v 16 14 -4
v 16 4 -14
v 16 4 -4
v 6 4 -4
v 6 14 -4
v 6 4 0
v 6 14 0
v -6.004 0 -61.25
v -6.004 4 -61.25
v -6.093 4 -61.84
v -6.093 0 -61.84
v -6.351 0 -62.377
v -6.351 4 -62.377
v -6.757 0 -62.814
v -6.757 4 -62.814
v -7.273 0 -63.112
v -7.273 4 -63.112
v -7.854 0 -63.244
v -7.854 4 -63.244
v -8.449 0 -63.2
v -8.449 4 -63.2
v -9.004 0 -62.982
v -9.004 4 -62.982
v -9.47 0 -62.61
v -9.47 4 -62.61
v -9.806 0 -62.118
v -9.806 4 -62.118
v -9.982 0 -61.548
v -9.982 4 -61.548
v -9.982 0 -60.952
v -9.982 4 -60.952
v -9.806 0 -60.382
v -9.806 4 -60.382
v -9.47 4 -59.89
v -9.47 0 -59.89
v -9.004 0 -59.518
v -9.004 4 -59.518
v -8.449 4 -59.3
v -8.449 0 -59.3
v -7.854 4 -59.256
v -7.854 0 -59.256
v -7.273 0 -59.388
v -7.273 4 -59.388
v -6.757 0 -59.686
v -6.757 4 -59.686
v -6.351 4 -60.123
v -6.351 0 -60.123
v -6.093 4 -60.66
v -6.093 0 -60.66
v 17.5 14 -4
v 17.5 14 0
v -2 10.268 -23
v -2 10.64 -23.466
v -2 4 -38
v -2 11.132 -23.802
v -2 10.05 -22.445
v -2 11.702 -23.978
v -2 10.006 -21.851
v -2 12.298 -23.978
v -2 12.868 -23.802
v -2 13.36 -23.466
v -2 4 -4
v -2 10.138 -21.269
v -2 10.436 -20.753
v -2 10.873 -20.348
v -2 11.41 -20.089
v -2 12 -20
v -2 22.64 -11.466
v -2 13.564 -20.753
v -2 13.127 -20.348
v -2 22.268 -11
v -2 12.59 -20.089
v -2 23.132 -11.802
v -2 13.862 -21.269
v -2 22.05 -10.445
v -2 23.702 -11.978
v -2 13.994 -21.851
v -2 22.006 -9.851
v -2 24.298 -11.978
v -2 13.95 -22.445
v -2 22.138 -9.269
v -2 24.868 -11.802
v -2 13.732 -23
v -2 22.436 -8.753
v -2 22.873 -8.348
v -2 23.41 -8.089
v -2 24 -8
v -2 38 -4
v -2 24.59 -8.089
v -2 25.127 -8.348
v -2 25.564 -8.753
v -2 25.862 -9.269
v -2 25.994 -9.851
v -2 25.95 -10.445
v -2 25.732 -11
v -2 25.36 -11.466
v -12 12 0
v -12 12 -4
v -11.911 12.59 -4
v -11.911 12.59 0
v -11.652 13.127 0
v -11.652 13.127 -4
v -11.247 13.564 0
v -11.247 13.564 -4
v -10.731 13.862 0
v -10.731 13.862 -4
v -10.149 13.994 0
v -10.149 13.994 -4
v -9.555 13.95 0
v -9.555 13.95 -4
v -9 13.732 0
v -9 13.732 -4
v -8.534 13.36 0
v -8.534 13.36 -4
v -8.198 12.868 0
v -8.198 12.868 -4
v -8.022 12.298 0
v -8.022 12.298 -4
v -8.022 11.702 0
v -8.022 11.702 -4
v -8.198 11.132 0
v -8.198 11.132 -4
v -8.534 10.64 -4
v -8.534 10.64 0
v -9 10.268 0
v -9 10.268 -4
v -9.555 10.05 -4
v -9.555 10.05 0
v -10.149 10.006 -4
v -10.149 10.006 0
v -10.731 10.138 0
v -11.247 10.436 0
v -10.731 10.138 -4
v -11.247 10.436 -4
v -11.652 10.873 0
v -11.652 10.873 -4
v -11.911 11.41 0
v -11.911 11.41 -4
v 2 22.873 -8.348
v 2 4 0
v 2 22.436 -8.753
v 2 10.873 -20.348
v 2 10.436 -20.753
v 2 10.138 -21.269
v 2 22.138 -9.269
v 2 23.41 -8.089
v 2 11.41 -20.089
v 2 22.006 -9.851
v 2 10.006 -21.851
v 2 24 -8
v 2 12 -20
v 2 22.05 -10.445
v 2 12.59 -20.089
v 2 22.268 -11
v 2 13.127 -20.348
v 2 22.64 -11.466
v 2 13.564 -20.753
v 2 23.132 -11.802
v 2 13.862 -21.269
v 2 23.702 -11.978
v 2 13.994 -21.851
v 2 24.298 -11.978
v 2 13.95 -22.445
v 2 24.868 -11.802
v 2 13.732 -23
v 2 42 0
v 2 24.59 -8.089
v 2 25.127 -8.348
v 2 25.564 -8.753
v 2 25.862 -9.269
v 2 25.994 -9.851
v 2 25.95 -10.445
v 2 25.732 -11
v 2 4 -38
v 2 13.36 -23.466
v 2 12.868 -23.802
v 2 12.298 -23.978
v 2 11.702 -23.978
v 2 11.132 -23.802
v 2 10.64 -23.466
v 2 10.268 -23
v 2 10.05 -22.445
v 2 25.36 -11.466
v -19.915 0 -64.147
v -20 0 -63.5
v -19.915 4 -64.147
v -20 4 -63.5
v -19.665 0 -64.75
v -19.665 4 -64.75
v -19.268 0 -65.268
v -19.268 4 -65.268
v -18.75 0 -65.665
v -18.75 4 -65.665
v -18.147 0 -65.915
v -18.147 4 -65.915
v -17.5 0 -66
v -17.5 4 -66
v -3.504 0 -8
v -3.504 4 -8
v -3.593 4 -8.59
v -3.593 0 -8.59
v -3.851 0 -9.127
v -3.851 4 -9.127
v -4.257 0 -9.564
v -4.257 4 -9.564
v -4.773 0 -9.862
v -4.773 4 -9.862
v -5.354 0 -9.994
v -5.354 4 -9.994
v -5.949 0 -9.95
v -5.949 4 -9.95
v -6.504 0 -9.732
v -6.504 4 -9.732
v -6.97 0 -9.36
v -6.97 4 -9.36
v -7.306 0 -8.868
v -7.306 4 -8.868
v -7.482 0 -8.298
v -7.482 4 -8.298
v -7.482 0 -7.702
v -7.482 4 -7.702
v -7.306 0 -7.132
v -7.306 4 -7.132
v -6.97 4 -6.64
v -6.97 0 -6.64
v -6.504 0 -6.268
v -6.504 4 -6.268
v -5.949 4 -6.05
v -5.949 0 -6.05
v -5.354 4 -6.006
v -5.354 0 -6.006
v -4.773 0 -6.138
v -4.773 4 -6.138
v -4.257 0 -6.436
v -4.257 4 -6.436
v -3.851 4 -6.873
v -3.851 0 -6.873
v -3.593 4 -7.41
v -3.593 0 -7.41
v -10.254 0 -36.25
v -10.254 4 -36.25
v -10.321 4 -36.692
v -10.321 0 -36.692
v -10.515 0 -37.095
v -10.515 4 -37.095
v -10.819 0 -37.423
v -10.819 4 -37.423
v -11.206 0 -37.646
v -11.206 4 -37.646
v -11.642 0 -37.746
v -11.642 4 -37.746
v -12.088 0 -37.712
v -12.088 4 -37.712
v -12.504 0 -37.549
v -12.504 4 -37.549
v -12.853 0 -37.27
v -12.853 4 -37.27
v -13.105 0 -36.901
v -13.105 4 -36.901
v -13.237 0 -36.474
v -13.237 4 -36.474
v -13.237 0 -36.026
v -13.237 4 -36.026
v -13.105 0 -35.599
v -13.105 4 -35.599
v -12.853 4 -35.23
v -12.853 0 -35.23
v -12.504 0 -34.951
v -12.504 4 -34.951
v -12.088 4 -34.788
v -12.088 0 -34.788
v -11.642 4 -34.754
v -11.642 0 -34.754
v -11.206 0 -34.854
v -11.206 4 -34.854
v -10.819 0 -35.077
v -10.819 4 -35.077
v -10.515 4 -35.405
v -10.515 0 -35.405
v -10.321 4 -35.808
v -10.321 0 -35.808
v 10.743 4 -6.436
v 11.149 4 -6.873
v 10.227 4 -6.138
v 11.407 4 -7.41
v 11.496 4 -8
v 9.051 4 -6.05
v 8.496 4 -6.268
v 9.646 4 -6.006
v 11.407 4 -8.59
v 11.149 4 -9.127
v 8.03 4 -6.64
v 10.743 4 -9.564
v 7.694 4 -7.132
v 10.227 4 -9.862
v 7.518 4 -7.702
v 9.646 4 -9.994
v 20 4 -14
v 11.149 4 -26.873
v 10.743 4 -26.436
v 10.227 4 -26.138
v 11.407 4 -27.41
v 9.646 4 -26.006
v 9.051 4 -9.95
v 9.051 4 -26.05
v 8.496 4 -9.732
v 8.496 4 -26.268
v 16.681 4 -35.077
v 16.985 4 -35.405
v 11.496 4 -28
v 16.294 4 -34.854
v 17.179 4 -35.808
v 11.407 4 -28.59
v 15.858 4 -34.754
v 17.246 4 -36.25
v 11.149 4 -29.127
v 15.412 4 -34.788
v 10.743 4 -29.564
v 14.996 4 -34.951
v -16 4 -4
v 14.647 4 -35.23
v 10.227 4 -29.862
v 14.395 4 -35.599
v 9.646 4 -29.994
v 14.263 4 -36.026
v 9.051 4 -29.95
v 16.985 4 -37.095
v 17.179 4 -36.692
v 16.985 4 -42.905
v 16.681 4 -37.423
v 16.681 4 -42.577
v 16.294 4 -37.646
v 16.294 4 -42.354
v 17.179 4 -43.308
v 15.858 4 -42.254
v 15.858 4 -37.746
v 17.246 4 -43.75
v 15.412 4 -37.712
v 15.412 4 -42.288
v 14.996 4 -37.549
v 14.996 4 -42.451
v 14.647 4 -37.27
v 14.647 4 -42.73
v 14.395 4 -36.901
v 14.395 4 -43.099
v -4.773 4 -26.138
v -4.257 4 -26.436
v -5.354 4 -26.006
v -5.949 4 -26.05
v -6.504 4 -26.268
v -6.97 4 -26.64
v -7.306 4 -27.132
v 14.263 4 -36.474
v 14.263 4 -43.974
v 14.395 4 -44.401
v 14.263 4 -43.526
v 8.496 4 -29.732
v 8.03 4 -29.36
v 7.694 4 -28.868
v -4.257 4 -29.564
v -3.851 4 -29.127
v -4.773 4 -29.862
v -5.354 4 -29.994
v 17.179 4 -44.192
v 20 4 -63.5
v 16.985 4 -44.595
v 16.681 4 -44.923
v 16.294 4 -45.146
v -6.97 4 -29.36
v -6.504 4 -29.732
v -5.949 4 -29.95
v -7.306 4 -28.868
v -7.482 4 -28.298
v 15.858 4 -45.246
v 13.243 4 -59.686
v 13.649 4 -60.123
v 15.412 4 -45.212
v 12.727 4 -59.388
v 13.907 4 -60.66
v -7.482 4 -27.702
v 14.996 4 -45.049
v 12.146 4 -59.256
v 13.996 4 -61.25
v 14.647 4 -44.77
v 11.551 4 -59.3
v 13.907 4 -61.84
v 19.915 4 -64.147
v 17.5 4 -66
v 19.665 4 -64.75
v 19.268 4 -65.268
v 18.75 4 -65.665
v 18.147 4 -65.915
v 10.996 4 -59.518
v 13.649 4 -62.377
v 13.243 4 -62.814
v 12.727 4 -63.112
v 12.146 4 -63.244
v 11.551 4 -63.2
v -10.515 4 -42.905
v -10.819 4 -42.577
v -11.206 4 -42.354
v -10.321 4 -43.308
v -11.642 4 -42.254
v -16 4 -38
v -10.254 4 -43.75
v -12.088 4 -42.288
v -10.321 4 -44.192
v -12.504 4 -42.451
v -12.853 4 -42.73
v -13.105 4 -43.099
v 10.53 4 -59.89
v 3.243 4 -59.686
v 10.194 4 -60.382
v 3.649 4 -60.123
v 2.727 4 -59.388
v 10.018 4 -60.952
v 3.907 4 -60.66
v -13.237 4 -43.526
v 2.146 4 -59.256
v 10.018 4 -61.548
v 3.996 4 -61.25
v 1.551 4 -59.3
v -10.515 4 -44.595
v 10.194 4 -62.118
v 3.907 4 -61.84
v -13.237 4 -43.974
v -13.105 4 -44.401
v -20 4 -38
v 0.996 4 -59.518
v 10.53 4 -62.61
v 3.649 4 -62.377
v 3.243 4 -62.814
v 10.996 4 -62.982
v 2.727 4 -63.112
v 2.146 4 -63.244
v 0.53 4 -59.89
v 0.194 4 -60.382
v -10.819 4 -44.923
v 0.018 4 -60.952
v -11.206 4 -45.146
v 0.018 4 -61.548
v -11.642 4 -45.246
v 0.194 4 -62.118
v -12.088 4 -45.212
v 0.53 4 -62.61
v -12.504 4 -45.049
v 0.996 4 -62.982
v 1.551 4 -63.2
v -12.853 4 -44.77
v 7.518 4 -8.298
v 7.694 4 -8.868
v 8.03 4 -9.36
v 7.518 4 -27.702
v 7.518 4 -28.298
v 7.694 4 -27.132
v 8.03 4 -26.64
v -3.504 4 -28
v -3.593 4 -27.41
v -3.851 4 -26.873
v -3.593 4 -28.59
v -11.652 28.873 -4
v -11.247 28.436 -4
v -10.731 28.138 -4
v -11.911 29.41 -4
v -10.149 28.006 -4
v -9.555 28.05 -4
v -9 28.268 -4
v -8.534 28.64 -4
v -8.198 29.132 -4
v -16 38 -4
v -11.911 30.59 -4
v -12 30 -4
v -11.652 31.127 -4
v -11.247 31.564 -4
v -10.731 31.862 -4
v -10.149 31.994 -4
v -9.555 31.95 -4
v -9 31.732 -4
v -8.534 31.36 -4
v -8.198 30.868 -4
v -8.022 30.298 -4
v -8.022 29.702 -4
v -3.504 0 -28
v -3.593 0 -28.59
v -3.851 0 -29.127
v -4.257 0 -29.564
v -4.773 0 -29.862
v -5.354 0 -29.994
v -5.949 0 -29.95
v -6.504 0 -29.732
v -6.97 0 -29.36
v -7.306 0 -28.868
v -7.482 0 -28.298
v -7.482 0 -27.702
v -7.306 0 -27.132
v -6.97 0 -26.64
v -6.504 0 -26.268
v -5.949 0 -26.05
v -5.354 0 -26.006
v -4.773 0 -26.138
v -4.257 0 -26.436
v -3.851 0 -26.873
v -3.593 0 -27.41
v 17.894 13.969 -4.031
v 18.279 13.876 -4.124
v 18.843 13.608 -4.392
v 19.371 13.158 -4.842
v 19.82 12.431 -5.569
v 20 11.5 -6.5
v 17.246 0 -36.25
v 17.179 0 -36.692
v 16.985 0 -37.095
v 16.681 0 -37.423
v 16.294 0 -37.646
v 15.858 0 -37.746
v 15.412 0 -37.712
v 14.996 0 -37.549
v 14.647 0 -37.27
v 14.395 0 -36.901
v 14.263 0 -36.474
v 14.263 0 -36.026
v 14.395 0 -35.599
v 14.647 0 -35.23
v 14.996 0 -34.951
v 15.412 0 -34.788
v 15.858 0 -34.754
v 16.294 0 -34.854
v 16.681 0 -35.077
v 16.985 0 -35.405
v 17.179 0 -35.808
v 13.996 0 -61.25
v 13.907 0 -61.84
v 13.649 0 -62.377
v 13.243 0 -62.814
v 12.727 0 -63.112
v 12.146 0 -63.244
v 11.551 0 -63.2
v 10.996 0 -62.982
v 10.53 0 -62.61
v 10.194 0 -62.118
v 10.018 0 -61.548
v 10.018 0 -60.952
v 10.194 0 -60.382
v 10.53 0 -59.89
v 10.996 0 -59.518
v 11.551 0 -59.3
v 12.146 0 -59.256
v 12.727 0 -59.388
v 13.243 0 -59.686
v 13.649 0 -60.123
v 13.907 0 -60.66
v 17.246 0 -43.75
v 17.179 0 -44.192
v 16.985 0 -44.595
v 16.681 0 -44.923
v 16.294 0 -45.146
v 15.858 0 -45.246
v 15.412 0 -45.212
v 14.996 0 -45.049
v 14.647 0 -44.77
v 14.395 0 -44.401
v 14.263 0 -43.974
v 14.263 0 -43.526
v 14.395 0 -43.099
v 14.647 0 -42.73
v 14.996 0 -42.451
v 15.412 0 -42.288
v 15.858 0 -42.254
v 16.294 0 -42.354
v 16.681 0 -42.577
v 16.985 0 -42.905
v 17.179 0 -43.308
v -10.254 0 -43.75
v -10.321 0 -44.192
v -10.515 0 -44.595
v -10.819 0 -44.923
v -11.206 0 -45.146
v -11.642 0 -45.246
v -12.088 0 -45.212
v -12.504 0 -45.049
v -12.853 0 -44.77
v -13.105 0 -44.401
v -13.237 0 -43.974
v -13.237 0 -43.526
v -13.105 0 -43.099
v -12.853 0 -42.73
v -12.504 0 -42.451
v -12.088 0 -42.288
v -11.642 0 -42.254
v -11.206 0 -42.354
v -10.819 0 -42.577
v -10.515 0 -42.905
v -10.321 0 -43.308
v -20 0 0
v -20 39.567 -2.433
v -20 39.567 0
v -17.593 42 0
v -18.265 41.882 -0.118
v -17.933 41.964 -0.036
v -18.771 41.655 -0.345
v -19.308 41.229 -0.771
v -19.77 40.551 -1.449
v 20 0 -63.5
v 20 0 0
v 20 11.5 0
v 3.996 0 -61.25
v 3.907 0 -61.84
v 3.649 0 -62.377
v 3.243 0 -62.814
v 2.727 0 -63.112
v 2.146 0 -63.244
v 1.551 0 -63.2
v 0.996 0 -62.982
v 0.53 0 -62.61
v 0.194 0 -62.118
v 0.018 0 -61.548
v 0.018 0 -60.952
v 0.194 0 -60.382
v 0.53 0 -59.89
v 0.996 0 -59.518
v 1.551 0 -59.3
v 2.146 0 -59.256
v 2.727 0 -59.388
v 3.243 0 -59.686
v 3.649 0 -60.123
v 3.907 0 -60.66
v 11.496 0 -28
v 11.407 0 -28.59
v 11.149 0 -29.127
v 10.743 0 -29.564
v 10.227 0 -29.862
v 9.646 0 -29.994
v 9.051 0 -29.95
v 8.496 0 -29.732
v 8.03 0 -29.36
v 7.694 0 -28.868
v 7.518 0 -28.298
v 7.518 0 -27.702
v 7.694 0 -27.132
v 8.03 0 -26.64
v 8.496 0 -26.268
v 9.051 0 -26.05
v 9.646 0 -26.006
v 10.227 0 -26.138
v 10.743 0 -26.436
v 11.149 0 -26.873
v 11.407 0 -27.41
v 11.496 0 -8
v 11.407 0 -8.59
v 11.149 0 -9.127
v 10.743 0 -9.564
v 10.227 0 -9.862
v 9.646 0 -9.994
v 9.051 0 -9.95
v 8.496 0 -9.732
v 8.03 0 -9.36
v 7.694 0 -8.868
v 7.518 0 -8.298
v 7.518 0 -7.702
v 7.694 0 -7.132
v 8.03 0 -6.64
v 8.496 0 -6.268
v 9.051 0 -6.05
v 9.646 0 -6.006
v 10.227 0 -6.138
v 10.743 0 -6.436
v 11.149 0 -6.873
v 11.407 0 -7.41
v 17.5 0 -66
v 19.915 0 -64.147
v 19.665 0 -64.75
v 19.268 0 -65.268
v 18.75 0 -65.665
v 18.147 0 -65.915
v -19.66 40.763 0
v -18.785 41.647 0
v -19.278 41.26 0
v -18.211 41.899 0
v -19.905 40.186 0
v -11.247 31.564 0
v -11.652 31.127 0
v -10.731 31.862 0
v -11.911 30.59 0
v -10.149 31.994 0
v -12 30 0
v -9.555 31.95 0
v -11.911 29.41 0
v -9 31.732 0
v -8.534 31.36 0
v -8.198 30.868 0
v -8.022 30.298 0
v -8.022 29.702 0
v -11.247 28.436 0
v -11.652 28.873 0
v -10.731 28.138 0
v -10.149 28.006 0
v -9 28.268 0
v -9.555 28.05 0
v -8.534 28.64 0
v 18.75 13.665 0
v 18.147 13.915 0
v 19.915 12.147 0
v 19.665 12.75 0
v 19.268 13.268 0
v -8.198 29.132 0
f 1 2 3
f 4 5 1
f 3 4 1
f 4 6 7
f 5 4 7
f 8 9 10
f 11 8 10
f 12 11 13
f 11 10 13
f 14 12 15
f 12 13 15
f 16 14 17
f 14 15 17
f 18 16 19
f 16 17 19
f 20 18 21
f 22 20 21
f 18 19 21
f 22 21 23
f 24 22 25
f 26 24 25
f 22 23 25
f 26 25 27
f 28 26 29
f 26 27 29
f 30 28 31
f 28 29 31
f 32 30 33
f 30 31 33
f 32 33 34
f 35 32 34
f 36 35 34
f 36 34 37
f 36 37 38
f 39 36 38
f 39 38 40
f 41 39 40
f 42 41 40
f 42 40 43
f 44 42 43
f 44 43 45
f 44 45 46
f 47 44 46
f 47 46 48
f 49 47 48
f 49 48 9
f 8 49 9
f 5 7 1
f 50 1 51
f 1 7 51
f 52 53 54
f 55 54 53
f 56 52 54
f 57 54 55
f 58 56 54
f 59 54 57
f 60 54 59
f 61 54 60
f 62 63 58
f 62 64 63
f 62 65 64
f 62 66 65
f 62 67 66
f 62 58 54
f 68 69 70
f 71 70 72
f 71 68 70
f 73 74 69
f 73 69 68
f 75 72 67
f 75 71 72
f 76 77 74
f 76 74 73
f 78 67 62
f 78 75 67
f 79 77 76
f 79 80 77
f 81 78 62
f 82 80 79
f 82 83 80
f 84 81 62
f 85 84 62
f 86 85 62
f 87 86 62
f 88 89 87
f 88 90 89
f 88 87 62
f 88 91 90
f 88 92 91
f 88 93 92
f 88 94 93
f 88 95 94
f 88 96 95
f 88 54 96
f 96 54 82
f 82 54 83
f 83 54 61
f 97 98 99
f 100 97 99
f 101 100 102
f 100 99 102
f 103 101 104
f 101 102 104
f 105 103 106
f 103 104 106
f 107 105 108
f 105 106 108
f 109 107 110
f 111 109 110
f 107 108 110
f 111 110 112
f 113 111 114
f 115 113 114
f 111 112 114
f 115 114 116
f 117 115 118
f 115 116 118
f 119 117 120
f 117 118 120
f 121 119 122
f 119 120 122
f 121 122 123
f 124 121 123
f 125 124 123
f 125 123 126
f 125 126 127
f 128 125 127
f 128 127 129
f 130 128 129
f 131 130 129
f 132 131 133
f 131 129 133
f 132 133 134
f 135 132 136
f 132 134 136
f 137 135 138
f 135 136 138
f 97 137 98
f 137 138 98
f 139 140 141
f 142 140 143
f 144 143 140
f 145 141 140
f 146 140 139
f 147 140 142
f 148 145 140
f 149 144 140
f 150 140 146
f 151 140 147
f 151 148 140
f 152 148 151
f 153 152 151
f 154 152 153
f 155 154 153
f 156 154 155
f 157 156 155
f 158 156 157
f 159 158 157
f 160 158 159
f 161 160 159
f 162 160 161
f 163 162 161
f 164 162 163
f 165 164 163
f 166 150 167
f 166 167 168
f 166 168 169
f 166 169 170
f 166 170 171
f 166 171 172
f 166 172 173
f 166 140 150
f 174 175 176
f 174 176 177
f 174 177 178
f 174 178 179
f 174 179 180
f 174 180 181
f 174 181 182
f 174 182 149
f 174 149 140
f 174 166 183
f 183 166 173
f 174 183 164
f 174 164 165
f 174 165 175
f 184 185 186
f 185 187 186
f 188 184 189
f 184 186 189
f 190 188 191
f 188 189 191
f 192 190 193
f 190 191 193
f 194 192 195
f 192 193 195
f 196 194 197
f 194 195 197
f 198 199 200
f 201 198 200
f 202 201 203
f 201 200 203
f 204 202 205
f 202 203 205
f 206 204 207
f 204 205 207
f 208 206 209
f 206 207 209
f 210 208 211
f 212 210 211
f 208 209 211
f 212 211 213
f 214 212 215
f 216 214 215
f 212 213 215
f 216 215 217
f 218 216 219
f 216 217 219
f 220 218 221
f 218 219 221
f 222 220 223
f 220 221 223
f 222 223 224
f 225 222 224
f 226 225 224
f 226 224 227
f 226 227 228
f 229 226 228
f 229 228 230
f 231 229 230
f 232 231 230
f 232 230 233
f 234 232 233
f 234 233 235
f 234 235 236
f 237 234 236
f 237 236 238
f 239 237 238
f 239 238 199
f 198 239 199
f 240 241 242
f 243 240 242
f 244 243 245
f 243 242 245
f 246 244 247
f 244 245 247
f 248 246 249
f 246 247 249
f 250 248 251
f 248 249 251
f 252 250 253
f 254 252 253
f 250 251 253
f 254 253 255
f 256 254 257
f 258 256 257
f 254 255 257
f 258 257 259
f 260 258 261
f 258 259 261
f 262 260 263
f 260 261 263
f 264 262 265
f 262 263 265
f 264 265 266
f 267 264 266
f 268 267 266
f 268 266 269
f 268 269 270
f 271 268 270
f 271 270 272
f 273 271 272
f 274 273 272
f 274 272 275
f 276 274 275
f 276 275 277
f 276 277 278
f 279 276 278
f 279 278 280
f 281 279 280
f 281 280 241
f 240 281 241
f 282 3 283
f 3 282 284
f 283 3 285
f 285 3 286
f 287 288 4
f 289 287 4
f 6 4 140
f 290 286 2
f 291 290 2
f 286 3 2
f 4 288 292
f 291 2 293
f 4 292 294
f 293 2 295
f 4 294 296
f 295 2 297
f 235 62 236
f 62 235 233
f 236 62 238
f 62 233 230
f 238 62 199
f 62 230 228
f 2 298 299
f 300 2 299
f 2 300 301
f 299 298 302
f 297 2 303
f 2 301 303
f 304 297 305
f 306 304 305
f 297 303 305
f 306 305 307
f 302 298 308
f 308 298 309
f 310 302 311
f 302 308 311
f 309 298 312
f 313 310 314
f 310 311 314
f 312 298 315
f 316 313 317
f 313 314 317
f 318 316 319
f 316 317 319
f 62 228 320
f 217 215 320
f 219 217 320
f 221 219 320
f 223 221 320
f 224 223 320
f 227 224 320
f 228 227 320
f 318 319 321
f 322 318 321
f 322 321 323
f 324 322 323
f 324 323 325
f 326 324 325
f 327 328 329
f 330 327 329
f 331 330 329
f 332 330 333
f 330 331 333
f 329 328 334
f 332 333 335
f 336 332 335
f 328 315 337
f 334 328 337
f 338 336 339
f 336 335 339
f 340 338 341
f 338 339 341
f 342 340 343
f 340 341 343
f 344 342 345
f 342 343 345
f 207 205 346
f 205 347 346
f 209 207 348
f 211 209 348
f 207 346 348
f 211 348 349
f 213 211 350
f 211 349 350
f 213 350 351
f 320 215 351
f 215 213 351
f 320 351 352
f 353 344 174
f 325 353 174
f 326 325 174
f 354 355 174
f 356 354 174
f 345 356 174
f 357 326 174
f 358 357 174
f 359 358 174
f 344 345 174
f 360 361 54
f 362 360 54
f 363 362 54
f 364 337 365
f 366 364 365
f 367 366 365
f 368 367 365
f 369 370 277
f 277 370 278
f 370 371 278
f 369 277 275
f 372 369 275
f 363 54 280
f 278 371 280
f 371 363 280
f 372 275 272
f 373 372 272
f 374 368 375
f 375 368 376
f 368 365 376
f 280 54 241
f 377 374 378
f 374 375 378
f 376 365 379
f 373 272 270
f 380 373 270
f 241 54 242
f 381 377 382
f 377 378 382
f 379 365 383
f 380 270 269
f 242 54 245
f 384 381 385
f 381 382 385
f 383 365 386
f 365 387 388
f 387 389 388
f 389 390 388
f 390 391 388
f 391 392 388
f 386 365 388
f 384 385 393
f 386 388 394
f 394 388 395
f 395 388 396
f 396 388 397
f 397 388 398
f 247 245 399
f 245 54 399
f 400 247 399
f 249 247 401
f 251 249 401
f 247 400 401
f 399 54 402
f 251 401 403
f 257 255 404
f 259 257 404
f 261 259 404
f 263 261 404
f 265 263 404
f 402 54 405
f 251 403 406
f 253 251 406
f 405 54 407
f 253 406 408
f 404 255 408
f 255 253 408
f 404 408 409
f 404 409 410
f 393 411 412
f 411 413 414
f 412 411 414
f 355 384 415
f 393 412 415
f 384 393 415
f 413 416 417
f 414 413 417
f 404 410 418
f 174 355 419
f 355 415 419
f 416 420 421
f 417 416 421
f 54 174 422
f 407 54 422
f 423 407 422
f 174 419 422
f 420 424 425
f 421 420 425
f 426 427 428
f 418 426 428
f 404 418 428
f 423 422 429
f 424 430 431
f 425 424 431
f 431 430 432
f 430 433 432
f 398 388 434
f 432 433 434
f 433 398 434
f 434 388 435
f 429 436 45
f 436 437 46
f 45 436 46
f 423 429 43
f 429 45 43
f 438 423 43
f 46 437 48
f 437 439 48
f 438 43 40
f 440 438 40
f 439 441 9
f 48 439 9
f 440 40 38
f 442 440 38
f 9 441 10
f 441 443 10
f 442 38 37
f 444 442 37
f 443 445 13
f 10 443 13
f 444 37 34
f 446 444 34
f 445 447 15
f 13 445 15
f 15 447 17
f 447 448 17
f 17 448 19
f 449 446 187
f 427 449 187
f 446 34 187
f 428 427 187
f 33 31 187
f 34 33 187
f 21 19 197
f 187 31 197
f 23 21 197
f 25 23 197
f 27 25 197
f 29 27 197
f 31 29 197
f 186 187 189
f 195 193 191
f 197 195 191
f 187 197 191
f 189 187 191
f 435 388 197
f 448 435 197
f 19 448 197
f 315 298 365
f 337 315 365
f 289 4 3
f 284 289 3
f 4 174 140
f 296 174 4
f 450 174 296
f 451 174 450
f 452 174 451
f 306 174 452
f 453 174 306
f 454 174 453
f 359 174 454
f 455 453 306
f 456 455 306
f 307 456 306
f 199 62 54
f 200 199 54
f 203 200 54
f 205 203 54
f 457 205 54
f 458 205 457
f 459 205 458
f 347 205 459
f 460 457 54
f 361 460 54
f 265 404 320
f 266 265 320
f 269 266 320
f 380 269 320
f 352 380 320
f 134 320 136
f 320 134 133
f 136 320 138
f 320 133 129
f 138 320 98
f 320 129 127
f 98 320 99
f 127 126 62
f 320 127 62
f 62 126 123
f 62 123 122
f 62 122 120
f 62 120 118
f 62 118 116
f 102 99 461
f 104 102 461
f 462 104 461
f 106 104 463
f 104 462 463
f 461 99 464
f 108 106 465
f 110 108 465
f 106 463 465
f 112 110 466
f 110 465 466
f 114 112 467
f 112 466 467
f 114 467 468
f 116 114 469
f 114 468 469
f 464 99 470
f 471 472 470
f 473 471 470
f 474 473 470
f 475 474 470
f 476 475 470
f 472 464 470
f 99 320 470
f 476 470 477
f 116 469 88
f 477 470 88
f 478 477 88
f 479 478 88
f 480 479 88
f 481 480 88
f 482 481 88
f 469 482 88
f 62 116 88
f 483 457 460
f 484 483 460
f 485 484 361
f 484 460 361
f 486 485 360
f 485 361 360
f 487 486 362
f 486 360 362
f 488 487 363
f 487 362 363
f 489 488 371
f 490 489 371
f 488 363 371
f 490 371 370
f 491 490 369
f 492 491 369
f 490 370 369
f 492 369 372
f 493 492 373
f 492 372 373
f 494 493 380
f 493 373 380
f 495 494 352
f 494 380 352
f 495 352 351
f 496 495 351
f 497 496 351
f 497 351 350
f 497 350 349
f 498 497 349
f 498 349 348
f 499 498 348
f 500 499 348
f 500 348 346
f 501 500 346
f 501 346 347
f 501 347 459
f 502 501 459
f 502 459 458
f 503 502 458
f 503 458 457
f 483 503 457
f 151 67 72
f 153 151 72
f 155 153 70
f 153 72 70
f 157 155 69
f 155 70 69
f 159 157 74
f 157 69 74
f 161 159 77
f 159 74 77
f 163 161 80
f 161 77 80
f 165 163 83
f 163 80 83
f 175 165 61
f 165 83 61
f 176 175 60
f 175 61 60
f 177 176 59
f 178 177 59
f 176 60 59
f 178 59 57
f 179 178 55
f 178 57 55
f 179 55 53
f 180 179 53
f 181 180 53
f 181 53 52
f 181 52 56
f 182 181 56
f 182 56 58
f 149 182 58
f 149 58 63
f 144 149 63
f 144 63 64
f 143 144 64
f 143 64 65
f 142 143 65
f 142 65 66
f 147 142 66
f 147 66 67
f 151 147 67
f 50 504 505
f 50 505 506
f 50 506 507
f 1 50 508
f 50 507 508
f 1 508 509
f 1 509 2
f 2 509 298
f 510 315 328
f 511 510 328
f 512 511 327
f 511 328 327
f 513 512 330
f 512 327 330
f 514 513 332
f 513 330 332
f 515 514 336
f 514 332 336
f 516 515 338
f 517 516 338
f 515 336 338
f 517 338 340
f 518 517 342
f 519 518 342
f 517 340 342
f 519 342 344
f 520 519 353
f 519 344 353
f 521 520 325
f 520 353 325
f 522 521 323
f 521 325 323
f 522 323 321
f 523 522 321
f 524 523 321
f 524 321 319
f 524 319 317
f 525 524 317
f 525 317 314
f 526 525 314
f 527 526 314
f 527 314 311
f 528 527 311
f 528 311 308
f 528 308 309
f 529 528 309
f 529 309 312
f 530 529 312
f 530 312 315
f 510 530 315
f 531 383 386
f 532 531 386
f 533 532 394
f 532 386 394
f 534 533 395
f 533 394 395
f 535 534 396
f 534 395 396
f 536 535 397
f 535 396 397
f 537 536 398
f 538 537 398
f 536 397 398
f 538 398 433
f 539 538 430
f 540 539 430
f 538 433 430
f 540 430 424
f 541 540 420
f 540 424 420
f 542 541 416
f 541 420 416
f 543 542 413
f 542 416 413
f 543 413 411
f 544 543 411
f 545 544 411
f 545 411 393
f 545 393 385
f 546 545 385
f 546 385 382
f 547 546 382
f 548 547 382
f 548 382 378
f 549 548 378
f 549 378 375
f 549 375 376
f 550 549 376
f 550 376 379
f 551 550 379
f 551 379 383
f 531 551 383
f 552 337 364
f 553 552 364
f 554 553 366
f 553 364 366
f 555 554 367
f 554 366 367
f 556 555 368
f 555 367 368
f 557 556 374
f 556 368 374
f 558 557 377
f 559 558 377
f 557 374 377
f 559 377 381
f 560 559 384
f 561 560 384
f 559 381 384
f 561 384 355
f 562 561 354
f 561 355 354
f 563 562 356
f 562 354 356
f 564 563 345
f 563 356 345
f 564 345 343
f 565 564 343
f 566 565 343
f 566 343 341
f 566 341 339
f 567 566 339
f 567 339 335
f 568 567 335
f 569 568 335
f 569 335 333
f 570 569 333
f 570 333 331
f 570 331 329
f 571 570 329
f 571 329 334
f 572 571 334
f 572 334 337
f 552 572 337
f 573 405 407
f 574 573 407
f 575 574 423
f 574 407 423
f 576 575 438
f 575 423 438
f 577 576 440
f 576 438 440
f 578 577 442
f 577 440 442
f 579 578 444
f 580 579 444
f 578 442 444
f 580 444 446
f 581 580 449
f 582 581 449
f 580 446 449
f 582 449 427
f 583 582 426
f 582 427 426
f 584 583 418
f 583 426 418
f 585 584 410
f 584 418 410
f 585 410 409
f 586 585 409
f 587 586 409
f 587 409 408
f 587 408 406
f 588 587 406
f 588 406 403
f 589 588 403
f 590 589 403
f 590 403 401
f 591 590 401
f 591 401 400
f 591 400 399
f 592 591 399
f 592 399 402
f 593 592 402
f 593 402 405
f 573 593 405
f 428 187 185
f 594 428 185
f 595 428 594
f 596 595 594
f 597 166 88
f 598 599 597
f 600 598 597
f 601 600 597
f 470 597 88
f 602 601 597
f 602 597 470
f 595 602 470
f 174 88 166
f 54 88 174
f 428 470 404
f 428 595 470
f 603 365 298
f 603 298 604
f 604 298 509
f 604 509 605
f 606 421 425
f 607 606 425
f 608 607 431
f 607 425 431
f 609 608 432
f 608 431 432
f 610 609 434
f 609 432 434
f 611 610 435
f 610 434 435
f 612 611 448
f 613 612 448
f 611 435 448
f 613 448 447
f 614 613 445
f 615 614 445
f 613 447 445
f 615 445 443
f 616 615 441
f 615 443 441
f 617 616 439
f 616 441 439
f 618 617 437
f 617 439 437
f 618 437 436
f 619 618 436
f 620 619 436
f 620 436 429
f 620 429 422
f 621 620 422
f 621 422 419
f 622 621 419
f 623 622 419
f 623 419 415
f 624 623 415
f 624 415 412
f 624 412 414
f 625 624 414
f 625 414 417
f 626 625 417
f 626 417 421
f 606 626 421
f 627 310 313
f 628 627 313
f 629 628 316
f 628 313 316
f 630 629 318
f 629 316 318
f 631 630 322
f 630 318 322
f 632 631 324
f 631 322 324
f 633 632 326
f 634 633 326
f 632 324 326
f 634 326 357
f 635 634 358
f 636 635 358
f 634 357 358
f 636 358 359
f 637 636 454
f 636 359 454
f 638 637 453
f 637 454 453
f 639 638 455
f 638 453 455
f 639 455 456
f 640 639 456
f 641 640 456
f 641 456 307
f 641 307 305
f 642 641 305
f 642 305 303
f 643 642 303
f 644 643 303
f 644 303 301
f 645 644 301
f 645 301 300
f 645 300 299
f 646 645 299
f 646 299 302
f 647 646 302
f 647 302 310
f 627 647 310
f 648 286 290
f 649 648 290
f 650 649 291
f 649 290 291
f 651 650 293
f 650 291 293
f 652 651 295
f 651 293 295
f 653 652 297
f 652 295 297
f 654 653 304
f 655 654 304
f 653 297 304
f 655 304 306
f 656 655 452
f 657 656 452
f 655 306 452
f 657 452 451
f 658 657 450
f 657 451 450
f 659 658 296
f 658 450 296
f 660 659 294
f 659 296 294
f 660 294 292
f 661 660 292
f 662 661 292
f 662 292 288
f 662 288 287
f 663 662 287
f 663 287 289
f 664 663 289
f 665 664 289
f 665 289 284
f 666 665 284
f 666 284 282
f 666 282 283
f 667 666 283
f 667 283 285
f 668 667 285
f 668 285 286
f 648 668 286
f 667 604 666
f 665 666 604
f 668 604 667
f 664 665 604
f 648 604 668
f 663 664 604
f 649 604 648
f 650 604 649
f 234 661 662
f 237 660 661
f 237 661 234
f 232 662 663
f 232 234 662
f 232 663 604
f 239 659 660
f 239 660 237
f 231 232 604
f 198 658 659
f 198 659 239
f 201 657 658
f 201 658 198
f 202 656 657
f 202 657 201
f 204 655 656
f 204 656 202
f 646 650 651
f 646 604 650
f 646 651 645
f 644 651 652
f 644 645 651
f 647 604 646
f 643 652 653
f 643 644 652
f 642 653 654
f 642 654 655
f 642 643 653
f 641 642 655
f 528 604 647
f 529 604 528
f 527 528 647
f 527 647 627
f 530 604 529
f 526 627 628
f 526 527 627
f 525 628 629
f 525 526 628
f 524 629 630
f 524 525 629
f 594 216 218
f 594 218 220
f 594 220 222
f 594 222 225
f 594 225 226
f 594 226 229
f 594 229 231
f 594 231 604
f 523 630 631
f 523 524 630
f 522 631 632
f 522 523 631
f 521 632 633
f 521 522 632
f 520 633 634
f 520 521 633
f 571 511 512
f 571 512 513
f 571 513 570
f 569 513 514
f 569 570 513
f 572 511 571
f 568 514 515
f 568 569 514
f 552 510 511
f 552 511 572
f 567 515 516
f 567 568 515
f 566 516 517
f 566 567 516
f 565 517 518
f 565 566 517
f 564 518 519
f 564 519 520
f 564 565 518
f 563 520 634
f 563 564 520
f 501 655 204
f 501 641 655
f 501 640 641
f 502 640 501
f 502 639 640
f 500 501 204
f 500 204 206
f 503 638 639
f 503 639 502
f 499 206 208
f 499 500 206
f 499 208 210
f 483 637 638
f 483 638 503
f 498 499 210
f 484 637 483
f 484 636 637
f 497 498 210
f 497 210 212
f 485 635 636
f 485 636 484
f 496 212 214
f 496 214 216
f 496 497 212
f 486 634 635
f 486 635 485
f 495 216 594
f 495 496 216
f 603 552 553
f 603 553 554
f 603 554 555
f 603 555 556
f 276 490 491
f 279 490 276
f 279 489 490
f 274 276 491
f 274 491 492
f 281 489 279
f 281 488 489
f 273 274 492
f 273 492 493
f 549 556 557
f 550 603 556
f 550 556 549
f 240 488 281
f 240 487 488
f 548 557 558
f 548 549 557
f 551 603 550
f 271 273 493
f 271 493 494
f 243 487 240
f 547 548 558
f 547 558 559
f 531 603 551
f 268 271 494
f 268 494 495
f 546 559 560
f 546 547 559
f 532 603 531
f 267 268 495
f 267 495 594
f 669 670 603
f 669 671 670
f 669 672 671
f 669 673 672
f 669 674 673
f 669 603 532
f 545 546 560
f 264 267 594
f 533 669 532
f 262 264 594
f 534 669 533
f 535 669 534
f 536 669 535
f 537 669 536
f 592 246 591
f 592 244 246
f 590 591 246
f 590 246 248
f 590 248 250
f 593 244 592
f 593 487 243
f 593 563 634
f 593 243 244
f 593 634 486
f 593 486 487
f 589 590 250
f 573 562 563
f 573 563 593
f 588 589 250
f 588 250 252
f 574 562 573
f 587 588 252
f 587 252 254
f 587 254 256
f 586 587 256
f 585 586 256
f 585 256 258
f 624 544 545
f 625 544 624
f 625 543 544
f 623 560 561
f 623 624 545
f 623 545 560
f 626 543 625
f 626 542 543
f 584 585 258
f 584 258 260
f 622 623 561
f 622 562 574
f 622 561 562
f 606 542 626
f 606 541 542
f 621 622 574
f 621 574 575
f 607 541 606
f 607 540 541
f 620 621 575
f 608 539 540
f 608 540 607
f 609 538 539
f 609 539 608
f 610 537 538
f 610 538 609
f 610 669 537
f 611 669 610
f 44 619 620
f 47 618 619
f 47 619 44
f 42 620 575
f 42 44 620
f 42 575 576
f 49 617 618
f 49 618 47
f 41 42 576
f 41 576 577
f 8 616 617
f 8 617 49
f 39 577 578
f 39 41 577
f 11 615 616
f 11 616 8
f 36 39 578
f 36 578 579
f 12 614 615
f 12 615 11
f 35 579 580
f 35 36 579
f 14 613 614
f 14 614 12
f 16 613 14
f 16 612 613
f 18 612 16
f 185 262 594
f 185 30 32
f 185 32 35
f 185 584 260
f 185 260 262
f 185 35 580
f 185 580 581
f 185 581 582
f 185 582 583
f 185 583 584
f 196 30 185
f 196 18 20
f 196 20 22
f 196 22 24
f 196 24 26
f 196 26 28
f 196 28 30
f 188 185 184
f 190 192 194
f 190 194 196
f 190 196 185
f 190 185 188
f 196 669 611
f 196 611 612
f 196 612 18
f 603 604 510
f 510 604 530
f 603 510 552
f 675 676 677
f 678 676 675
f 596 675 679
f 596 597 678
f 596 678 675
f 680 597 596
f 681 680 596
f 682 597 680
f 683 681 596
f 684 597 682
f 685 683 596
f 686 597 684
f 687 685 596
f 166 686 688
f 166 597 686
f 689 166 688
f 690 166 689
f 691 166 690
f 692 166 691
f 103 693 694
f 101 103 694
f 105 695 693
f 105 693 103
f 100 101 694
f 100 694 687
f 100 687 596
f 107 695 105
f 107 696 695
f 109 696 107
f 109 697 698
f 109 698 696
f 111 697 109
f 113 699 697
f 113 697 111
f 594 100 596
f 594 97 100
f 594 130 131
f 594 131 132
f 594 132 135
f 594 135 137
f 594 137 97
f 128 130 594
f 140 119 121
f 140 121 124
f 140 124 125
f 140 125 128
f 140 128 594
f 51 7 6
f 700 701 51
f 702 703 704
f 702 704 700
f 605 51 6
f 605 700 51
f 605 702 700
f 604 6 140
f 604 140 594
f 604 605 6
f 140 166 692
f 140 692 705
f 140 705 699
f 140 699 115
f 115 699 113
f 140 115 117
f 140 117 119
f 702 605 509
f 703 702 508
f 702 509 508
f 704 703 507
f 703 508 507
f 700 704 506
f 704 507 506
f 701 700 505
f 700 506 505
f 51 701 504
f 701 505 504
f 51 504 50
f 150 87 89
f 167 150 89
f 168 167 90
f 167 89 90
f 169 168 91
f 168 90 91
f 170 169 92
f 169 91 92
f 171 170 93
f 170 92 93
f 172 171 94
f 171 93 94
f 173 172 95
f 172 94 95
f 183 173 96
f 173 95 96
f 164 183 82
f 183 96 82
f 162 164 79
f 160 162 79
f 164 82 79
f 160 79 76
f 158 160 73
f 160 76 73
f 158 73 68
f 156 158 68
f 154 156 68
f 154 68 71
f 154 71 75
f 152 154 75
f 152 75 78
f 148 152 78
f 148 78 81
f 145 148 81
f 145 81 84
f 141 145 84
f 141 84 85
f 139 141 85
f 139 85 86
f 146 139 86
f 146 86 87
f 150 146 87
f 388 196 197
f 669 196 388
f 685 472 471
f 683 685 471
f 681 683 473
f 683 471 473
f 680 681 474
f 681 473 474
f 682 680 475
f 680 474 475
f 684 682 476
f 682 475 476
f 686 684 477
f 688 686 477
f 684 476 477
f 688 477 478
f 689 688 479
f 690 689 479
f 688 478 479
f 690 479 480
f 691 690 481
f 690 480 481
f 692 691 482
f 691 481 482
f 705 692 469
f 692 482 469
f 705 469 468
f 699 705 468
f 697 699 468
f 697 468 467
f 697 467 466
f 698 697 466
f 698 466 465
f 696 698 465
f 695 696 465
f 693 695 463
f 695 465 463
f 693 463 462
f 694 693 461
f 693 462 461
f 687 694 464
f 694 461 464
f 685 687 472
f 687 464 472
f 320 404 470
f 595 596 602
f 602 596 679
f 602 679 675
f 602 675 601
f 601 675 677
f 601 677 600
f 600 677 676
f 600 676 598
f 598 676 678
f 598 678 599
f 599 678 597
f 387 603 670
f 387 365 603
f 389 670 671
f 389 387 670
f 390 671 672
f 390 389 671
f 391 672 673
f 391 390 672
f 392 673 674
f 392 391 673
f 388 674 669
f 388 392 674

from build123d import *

# Parameters (mm, degrees)
BOSS_EXTRUDE1_DEPTH  = 4
SKETCH2_R            = 2
SKETCH2_R_2          = 1.5
CUT_EXTRUDE1_DEPTH   = 5
BOSS_EXTRUDE5_DEPTH  = 4
SKETCH6_W            = 18
SKETCH6_H            = 34
BOSS_EXTRUDE6_DEPTH  = 4
SKETCH7_W            = 14
SKETCH7_H            = 10
BOSS_EXTRUDE7_DEPTH  = 4
SKETCH8_R            = 2
CUT_EXTRUDE2_DEPTH   = 23
SKETCH9_R            = 2
CUT_EXTRUDE3_DEPTH   = 4
BOSS_EXTRUDE8_DEPTH  = 22
BOSS_EXTRUDE9_DEPTH  = 4
BOSS_EXTRUDE10_DEPTH = 4
CUT_EXTRUDE5_DEPTH   = 4
FILLET7_R            = 2.5
FILLET8_R            = 2.5


with BuildPart() as part:
    # Sketch1 → Boss-Extrude1 (new body)
    with BuildSketch(Plane(origin=(0, 0, 0), x_dir=(1, 0, 0), z_dir=(0, 1, 0))):
        Polygon((-20, 66), (20, 66), (20, 6), (20, 0), (-20, 0), (-20, 6), align=None)
    extrude(amount=BOSS_EXTRUDE1_DEPTH)

    # Sketch2 → Cut-Extrude1 (cut, through all)
    with BuildSketch(Plane(origin=(0, 4, 0), x_dir=(1, 0, 0), z_dir=(0, 1, 0))):
        with Locations((-8.00387182, 61.25)):
            Circle(SKETCH2_R)
        with Locations((1.99612818, 61.25)):
            Circle(SKETCH2_R)
        with Locations((11.99612818, 61.25)):
            Circle(SKETCH2_R)
        with Locations((-5.50387182, 8)):
            Circle(SKETCH2_R)
        with Locations((-5.50387182, 28)):
            Circle(SKETCH2_R)
        with Locations((9.49612818, 28)):
            Circle(SKETCH2_R)
        with Locations((9.49612818, 8)):
            Circle(SKETCH2_R)
        with Locations((15.74612818, 36.25)):
            Circle(SKETCH2_R_2)
        with Locations((15.74612818, 43.75)):
            Circle(SKETCH2_R_2)
        with Locations((-11.75387182, 43.75)):
            Circle(SKETCH2_R_2)
        with Locations((-11.75387182, 36.25)):
            Circle(SKETCH2_R_2)
    extrude(amount=-CUT_EXTRUDE1_DEPTH, mode=Mode.SUBTRACT)

    # Sketch5 → Boss-Extrude5 (add)
    with BuildSketch(Plane(origin=(2, 0, 0), x_dir=(0, 0, -1), z_dir=(1, 0, 0))):
        Polygon((0, 4), (0, 38), (4, 38), (38, 4), align=None)
    extrude(amount=-BOSS_EXTRUDE5_DEPTH)

    # Sketch6 → Boss-Extrude6 (add)
    with BuildSketch(Plane.XY):
        with Locations((-11, 21)):
            Rectangle(SKETCH6_W, SKETCH6_H)
    extrude(amount=-BOSS_EXTRUDE6_DEPTH)

    # Sketch7 → Boss-Extrude7 (add)
    with BuildSketch(Plane.XY):
        with Locations((13, 9)):
            Rectangle(SKETCH7_W, SKETCH7_H)
    extrude(amount=-BOSS_EXTRUDE7_DEPTH)

    # Sketch8 → Cut-Extrude2 (cut, through all)
    with BuildSketch(Plane.ZY.offset(2)):
        with Locations((-10, 24)):
            Circle(SKETCH8_R)
        with Locations((-22, 12)):
            Circle(SKETCH8_R)
    extrude(amount=-CUT_EXTRUDE2_DEPTH, mode=Mode.SUBTRACT)

    # Sketch9 → Cut-Extrude3 (cut)
    with BuildSketch(Plane(origin=(0, 0, -4), x_dir=(-1, 0, 0), z_dir=(0, 0, -1))):
        with Locations((10, 12)):
            Circle(SKETCH9_R)
        with Locations((10, 30)):
            Circle(SKETCH9_R)
    extrude(amount=-CUT_EXTRUDE3_DEPTH, mode=Mode.SUBTRACT)

    # Sketch10 → Boss-Extrude8 (add)
    with BuildSketch(Plane(origin=(2, 0, 0), x_dir=(0, 0, -1), z_dir=(1, 0, 0))):
        Polygon((4, 38), (0, 42), (0, 38), align=None)
    extrude(amount=-BOSS_EXTRUDE8_DEPTH)

    # Sketch13 → Boss-Extrude9 (add)
    with BuildSketch(Plane(origin=(20, 0, 0), x_dir=(0, 0, -1), z_dir=(1, 0, 0))):
        Polygon((4, 14), (14, 4), (4, 4), align=None)
    extrude(amount=-BOSS_EXTRUDE9_DEPTH)

    # Sketch14 → Boss-Extrude10 (add)
    with BuildSketch(Plane.ZY.offset(20)):
        Polygon((-4, 38), (-38, 4), (-4, 4), align=None)
    extrude(amount=-BOSS_EXTRUDE10_DEPTH)

    # Sketch16 → Cut-Extrude5 (cut)
    with BuildSketch(Plane.XY):
        with BuildLine():
            Line((-20, 42), (-20, 39.566764618))
            ThreePointArc((-20, 39.566764618), (-19.278186488, 41.259842846), (-17.593046725, 42))
            Line((-17.593046725, 42), (-20, 42))
        make_face()
    extrude(amount=-CUT_EXTRUDE5_DEPTH, mode=Mode.SUBTRACT)

    # Fillet7
    fillet7_edges = [part.edges().sort_by_distance(p)[0] for p in [
        (-20, 2, -66),
        (20, 2, -66),
    ]]
    fillet(fillet7_edges, radius=FILLET7_R)

    # Fillet8
    fillet8_edges = [part.edges().sort_by_distance(p)[0] for p in [
        (20, 14, -2),
    ]]
    fillet(fillet8_edges, radius=FILLET8_R)


solid = part.part
